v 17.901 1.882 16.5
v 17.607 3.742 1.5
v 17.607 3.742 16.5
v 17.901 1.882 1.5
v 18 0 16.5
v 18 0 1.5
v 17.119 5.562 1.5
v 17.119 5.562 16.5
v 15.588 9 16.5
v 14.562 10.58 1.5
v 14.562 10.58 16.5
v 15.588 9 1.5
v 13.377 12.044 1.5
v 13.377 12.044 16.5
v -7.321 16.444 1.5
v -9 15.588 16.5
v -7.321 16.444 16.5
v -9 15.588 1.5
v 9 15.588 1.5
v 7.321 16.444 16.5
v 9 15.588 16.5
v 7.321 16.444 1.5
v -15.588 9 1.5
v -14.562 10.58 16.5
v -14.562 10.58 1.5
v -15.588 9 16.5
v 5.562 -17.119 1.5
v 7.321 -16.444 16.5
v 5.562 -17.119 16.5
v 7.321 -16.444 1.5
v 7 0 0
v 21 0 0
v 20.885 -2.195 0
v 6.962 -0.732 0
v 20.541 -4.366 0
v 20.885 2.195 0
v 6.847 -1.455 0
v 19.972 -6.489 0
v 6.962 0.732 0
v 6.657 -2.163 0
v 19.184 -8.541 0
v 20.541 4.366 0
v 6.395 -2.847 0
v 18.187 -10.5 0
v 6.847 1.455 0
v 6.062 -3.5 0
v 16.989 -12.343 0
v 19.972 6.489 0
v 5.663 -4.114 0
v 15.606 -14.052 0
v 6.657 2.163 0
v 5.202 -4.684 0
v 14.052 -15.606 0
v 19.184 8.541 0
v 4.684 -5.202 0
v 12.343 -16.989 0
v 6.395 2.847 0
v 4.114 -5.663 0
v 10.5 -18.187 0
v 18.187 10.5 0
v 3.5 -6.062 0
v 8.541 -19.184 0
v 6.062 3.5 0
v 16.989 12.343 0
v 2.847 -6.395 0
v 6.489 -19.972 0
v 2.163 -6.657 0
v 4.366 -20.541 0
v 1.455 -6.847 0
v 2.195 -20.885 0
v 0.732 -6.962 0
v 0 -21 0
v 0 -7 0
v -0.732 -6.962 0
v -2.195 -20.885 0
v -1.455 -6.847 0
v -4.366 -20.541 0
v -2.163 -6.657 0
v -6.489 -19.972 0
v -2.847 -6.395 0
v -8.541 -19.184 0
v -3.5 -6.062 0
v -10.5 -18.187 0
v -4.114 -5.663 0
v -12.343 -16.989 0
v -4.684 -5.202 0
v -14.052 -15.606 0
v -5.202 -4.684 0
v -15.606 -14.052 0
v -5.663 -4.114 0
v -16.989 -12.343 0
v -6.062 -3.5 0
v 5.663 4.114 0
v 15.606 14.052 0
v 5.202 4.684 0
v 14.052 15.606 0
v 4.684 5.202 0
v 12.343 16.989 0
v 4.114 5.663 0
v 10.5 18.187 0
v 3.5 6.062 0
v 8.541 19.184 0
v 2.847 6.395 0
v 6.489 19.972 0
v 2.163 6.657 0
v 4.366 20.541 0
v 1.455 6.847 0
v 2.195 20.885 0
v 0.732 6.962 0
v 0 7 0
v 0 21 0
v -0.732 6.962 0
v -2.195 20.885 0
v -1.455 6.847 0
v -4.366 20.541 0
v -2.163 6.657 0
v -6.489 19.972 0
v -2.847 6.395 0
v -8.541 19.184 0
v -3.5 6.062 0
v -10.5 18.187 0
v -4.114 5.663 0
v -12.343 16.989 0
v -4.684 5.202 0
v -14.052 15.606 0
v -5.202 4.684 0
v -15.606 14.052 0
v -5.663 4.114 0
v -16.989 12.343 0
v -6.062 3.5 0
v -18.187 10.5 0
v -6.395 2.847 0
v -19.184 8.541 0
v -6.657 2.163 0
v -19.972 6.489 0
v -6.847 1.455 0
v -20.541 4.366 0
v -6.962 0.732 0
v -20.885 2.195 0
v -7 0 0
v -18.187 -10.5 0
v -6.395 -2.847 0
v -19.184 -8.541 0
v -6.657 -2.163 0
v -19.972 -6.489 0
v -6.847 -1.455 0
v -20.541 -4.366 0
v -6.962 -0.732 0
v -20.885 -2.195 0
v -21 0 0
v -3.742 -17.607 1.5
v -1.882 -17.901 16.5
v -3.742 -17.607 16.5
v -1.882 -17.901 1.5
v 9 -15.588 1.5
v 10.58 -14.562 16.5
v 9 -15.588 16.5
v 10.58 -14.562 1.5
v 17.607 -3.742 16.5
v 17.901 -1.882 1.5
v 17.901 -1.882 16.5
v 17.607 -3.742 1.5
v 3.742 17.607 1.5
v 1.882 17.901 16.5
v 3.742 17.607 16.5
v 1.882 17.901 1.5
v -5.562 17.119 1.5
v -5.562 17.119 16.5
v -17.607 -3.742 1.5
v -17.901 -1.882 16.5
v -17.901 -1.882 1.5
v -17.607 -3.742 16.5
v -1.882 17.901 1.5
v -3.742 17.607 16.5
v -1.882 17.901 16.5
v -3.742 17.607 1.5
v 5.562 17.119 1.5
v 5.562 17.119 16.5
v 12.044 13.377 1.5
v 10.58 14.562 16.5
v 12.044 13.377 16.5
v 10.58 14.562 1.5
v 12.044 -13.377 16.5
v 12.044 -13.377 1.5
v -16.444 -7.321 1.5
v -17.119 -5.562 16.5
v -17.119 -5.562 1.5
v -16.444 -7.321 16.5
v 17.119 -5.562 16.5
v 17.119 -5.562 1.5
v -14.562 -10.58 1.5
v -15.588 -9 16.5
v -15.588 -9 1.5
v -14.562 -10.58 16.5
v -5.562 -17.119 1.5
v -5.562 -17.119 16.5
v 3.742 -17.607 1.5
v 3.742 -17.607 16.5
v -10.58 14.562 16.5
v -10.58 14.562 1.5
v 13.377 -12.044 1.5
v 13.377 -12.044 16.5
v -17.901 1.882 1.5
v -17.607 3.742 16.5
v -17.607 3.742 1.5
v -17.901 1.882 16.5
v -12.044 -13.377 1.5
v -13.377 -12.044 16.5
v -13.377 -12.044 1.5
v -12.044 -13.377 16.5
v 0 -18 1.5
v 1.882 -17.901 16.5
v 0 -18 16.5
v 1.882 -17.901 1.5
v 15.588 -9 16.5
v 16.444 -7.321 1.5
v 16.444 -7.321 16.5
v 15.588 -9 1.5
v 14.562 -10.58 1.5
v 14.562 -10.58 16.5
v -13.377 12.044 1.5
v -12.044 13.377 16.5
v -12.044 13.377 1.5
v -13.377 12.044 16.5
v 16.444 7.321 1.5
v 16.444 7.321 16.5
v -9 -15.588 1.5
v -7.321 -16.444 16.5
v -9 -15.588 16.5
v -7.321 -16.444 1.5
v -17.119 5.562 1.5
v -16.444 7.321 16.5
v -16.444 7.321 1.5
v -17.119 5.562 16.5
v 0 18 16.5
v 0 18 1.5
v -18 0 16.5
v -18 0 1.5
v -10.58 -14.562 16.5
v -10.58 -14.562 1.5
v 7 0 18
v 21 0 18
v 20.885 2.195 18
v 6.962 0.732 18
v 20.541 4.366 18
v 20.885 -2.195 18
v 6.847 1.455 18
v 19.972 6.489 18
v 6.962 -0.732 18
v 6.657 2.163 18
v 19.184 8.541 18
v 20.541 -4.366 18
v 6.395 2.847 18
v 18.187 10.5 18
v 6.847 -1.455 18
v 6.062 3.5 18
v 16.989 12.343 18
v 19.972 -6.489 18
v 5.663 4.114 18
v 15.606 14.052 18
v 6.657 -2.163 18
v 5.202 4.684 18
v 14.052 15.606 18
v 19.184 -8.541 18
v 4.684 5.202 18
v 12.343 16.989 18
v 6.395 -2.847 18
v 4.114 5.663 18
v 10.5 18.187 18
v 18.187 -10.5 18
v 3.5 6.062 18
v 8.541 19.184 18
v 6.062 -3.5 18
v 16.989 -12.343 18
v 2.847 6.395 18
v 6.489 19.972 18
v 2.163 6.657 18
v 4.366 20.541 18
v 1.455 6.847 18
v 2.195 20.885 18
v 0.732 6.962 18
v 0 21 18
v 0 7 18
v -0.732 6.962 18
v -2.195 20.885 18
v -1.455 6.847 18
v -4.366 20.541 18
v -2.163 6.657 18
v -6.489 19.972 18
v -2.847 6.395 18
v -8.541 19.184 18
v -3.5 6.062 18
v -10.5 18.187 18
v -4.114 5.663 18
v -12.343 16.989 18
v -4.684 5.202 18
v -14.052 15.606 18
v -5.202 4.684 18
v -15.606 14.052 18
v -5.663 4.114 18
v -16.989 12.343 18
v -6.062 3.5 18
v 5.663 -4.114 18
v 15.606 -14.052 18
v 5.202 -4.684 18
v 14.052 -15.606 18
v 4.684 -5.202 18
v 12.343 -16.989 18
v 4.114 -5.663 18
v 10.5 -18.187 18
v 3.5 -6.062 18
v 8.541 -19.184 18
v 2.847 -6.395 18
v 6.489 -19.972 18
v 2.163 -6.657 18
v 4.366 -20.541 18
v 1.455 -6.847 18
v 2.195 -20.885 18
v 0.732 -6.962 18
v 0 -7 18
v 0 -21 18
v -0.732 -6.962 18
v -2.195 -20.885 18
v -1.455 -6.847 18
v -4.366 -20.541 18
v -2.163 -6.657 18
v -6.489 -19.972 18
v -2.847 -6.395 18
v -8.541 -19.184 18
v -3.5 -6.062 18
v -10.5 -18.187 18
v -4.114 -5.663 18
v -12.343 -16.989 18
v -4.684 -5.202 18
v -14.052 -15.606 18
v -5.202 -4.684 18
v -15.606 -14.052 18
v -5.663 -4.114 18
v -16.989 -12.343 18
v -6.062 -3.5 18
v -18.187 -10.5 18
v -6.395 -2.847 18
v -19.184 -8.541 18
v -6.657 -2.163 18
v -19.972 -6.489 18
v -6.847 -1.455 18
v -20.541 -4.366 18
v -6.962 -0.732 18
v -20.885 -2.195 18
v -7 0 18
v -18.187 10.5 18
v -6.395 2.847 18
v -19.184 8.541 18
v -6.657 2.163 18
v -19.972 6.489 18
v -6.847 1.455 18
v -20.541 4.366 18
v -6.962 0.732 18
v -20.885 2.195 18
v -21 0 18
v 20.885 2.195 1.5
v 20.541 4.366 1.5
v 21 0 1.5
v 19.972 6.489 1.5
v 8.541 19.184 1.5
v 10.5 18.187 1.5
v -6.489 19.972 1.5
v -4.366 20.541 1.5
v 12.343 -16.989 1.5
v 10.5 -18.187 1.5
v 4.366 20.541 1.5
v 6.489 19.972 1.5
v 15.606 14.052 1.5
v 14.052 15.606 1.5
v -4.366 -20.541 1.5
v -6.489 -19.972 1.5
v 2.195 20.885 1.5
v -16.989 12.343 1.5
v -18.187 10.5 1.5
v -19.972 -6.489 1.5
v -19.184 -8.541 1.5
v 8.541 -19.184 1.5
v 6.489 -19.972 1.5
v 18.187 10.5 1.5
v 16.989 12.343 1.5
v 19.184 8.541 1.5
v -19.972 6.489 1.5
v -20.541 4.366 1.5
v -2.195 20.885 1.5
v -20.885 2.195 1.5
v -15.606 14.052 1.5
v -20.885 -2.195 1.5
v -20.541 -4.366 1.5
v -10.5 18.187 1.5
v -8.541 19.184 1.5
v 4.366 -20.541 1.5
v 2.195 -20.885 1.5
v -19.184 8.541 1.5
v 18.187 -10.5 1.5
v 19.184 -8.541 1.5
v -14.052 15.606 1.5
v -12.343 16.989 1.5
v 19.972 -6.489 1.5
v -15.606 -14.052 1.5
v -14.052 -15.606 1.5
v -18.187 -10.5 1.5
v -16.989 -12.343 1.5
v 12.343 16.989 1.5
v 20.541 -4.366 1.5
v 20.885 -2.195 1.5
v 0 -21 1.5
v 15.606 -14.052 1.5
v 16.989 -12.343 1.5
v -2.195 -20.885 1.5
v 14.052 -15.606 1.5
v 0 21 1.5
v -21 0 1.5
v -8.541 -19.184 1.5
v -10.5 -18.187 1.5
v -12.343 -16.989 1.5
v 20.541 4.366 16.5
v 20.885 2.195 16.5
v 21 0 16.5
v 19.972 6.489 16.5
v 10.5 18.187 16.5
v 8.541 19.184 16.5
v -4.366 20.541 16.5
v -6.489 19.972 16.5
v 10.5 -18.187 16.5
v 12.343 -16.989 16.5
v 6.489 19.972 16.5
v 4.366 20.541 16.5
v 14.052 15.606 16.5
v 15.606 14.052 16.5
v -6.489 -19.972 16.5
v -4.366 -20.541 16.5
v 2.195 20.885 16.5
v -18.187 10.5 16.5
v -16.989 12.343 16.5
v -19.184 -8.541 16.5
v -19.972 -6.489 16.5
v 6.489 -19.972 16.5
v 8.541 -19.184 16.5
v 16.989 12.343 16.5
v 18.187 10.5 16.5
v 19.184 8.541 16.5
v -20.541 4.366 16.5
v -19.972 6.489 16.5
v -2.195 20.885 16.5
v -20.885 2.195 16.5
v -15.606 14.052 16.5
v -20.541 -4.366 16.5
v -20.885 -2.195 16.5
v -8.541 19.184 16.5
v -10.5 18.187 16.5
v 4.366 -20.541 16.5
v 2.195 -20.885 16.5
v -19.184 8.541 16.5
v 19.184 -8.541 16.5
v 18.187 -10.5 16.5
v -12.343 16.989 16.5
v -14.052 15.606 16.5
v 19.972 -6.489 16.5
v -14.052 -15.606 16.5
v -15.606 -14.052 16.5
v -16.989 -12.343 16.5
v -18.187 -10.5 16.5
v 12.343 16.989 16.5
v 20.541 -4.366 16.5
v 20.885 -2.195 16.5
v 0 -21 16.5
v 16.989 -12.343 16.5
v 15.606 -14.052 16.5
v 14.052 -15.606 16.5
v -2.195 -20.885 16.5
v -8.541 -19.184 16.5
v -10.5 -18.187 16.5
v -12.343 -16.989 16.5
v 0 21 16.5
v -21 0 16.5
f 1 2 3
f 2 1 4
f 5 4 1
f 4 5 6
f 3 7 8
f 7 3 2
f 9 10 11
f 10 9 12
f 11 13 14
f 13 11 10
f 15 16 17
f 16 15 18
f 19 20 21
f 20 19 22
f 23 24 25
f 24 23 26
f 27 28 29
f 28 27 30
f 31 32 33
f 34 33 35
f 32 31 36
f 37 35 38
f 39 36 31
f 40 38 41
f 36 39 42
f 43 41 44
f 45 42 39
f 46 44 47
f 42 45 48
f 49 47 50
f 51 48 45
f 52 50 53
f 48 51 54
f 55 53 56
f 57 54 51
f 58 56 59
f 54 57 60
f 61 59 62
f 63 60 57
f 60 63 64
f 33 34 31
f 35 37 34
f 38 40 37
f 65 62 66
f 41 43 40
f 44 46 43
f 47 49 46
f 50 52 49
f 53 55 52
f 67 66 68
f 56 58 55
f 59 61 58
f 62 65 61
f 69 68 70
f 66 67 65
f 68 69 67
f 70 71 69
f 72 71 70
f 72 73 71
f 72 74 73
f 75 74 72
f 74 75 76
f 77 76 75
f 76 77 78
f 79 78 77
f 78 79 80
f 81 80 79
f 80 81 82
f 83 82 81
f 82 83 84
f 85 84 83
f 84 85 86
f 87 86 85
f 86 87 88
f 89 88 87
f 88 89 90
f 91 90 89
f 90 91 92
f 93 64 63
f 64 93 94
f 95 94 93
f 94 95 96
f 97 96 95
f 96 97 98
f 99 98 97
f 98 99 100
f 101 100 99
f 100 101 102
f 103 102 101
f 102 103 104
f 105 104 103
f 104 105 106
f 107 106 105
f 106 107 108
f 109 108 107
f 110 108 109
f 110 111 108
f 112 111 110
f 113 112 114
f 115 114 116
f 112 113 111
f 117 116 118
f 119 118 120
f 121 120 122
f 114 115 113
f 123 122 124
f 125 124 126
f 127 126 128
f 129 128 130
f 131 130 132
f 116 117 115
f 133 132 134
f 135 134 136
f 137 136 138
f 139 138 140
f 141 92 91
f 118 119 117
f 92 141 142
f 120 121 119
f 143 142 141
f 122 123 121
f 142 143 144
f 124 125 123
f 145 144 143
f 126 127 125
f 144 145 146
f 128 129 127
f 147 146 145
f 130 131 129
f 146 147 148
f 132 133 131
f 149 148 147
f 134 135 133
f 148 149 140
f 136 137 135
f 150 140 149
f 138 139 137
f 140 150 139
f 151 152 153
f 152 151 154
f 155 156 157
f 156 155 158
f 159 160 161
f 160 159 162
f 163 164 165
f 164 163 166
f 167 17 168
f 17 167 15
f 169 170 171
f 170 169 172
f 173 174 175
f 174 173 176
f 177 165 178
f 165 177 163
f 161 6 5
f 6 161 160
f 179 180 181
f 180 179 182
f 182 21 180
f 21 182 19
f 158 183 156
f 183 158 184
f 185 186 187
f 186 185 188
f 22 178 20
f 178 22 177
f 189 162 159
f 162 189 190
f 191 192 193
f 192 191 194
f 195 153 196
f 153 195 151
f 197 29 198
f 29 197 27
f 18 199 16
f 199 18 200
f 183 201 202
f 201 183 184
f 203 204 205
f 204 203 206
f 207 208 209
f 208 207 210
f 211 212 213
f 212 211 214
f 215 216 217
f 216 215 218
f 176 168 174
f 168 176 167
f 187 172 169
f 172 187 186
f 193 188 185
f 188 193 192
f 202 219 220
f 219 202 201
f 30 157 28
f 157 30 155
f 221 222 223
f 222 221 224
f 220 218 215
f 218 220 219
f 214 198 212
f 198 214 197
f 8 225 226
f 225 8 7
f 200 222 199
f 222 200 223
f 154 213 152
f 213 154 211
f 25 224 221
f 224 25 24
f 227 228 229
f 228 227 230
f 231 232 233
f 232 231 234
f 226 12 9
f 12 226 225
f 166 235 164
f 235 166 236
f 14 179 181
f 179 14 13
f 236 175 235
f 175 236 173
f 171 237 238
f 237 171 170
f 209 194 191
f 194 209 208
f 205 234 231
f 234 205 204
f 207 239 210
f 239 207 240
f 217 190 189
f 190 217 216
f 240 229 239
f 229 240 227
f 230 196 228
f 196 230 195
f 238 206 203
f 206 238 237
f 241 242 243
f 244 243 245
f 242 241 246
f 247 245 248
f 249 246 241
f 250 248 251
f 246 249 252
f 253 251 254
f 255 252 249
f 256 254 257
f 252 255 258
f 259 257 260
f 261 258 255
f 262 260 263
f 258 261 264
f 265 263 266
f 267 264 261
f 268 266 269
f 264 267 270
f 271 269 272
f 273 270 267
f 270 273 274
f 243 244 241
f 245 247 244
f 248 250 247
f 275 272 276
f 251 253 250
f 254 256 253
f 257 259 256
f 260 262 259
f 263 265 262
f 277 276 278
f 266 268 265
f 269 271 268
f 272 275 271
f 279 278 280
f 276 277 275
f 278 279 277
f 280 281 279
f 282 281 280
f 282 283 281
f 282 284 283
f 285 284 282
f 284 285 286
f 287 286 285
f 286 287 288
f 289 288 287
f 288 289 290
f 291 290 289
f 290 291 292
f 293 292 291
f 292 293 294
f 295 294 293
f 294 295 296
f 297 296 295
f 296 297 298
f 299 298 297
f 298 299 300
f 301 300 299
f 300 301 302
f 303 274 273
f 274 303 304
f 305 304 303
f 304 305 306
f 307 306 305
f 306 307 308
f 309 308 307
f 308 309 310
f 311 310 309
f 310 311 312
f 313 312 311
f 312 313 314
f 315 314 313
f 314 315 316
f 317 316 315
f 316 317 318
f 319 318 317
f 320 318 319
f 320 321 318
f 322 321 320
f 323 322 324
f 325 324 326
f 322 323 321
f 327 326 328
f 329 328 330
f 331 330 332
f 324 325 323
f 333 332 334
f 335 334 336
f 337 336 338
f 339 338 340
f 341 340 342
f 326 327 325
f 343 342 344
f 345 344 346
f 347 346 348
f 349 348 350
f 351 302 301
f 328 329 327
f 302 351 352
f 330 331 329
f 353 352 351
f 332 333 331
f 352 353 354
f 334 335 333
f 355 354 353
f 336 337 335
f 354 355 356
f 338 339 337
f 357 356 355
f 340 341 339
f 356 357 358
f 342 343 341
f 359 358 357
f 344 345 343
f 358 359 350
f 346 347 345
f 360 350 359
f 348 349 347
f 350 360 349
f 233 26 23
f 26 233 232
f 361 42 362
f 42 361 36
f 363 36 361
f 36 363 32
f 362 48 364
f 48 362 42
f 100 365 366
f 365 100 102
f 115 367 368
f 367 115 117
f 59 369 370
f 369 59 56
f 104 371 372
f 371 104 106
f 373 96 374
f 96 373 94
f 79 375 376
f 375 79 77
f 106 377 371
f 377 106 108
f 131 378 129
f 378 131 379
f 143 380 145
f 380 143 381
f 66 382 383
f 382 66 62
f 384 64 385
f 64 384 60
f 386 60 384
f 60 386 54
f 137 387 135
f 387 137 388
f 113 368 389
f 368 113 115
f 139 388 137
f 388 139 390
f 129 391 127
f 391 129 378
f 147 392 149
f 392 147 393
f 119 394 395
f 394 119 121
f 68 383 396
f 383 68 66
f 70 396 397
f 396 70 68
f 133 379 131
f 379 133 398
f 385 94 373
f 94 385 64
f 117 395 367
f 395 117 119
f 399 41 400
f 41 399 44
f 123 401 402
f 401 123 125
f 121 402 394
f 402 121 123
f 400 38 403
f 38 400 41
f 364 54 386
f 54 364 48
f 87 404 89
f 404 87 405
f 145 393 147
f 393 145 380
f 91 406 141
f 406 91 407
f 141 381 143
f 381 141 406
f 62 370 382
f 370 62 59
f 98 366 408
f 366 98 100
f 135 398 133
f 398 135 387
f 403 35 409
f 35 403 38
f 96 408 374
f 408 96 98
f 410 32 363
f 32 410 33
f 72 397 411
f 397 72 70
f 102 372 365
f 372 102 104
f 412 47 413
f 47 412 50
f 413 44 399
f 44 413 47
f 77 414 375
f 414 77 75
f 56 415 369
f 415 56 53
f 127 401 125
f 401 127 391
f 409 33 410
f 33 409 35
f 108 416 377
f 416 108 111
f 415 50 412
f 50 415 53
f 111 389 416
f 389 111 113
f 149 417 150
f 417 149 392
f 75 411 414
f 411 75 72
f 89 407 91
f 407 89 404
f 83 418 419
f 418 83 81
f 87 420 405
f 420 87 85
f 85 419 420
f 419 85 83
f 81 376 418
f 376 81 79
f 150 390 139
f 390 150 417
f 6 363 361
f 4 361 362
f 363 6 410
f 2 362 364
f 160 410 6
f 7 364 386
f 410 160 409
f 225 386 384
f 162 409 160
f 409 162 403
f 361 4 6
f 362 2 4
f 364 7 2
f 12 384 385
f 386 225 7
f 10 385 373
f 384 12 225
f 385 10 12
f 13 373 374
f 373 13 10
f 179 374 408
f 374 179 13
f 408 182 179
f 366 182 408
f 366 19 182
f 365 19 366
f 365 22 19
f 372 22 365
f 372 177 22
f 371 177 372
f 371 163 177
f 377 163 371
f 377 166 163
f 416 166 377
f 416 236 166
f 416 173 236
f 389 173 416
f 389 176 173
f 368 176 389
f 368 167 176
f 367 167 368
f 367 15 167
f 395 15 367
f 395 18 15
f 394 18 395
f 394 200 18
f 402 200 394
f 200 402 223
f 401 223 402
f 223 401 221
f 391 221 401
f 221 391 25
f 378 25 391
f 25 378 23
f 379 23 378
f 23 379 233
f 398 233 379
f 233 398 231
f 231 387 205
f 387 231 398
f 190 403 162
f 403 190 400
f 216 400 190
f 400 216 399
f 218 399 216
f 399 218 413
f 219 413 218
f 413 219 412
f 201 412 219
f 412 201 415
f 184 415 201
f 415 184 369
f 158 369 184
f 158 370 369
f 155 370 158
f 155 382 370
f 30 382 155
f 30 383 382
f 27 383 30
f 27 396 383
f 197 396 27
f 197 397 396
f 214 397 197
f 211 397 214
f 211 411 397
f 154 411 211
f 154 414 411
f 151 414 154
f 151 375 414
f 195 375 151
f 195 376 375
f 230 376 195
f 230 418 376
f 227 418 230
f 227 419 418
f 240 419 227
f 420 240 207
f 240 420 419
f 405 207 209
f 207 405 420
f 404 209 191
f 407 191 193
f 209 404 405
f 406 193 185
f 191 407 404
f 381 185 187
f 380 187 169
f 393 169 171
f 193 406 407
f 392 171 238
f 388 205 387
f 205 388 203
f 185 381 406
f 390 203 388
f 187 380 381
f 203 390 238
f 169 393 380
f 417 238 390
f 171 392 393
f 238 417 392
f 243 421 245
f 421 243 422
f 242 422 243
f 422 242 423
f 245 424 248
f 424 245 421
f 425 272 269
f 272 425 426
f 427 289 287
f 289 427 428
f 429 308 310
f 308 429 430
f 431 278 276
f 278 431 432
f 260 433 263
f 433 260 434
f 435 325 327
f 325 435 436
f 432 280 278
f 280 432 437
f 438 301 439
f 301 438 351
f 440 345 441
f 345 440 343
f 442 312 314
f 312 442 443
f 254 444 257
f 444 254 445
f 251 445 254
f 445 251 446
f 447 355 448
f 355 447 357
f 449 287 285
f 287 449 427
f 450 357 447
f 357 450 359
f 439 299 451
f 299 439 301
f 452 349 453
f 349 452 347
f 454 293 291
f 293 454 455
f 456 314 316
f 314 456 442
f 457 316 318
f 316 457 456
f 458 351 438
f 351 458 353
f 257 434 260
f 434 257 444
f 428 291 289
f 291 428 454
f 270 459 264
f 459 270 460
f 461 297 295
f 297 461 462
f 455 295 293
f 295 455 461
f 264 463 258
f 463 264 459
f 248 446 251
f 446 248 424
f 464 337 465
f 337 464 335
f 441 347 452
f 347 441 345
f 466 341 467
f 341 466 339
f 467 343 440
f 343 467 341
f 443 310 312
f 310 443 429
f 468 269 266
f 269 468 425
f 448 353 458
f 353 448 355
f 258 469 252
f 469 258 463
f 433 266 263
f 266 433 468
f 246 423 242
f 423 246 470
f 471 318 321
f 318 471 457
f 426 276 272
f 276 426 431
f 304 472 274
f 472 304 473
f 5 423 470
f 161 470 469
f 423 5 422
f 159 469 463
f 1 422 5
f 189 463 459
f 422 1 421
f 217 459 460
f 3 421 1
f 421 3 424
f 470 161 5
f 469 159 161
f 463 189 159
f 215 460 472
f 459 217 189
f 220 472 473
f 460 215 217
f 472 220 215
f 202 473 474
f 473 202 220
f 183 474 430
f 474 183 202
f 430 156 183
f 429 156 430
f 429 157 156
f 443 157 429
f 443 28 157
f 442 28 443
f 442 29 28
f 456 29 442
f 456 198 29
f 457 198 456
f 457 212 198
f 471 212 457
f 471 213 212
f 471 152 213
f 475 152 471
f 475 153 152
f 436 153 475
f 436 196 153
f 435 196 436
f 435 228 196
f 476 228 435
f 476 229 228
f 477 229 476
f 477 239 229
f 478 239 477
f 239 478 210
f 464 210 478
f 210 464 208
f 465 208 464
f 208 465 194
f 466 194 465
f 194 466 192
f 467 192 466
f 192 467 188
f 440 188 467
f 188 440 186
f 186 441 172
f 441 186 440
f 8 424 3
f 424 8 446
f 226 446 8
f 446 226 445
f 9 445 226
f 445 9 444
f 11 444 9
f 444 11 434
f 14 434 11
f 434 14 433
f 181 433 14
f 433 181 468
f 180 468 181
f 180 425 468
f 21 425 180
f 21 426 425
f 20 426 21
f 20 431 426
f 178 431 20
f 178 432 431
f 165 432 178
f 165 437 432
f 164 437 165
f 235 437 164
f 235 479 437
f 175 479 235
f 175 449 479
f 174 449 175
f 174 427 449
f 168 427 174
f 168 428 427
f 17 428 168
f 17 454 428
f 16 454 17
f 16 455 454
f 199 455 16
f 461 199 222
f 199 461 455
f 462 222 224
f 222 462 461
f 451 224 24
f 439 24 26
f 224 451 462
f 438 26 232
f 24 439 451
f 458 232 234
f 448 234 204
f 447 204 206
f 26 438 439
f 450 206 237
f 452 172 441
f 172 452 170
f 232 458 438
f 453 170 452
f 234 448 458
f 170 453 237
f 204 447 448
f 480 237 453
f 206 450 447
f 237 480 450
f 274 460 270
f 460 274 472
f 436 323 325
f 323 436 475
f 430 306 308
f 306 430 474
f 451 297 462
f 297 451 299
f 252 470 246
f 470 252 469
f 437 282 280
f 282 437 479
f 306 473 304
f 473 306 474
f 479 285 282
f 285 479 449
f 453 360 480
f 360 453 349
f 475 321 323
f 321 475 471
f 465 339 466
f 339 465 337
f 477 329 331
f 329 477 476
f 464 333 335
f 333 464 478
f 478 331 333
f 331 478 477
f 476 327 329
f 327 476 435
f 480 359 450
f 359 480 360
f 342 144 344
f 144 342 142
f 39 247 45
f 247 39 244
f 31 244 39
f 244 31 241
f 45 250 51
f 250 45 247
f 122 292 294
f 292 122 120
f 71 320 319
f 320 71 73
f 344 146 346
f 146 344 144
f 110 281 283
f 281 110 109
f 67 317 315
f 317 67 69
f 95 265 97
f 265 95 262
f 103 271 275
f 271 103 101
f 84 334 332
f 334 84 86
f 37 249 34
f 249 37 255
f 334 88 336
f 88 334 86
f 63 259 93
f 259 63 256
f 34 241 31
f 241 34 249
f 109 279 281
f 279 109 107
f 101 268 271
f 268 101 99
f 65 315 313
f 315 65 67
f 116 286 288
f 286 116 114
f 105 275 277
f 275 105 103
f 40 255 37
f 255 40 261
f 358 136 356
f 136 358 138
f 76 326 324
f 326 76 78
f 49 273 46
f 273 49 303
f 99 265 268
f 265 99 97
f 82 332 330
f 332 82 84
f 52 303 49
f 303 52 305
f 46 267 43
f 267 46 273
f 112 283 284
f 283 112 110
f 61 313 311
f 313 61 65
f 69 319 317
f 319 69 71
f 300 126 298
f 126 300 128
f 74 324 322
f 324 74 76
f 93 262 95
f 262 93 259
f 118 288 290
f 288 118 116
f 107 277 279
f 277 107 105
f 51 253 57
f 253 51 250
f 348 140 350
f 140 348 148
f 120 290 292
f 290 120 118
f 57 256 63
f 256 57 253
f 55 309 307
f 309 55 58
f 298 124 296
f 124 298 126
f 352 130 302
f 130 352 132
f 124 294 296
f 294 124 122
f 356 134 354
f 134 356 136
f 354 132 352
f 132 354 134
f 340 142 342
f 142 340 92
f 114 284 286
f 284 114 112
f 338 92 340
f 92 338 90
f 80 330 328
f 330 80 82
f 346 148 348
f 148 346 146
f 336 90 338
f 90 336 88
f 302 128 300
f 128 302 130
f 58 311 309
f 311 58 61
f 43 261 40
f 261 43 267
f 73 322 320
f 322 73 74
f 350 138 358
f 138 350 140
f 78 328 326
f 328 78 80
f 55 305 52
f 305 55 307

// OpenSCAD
// Belt-guide pulley flange.
$fn = 60;
eps = 0.02;
bore_d = 14;
body_d = 36;
width = 18;
difference() { union() { cylinder(d=body_d,h=width); cylinder(d=body_d+6,h=1.5); translate([0,0,width-1.5]) cylinder(d=body_d+6,h=1.5); } translate([0,0,-eps]) cylinder(d=bore_d,h=width+2*eps); }
